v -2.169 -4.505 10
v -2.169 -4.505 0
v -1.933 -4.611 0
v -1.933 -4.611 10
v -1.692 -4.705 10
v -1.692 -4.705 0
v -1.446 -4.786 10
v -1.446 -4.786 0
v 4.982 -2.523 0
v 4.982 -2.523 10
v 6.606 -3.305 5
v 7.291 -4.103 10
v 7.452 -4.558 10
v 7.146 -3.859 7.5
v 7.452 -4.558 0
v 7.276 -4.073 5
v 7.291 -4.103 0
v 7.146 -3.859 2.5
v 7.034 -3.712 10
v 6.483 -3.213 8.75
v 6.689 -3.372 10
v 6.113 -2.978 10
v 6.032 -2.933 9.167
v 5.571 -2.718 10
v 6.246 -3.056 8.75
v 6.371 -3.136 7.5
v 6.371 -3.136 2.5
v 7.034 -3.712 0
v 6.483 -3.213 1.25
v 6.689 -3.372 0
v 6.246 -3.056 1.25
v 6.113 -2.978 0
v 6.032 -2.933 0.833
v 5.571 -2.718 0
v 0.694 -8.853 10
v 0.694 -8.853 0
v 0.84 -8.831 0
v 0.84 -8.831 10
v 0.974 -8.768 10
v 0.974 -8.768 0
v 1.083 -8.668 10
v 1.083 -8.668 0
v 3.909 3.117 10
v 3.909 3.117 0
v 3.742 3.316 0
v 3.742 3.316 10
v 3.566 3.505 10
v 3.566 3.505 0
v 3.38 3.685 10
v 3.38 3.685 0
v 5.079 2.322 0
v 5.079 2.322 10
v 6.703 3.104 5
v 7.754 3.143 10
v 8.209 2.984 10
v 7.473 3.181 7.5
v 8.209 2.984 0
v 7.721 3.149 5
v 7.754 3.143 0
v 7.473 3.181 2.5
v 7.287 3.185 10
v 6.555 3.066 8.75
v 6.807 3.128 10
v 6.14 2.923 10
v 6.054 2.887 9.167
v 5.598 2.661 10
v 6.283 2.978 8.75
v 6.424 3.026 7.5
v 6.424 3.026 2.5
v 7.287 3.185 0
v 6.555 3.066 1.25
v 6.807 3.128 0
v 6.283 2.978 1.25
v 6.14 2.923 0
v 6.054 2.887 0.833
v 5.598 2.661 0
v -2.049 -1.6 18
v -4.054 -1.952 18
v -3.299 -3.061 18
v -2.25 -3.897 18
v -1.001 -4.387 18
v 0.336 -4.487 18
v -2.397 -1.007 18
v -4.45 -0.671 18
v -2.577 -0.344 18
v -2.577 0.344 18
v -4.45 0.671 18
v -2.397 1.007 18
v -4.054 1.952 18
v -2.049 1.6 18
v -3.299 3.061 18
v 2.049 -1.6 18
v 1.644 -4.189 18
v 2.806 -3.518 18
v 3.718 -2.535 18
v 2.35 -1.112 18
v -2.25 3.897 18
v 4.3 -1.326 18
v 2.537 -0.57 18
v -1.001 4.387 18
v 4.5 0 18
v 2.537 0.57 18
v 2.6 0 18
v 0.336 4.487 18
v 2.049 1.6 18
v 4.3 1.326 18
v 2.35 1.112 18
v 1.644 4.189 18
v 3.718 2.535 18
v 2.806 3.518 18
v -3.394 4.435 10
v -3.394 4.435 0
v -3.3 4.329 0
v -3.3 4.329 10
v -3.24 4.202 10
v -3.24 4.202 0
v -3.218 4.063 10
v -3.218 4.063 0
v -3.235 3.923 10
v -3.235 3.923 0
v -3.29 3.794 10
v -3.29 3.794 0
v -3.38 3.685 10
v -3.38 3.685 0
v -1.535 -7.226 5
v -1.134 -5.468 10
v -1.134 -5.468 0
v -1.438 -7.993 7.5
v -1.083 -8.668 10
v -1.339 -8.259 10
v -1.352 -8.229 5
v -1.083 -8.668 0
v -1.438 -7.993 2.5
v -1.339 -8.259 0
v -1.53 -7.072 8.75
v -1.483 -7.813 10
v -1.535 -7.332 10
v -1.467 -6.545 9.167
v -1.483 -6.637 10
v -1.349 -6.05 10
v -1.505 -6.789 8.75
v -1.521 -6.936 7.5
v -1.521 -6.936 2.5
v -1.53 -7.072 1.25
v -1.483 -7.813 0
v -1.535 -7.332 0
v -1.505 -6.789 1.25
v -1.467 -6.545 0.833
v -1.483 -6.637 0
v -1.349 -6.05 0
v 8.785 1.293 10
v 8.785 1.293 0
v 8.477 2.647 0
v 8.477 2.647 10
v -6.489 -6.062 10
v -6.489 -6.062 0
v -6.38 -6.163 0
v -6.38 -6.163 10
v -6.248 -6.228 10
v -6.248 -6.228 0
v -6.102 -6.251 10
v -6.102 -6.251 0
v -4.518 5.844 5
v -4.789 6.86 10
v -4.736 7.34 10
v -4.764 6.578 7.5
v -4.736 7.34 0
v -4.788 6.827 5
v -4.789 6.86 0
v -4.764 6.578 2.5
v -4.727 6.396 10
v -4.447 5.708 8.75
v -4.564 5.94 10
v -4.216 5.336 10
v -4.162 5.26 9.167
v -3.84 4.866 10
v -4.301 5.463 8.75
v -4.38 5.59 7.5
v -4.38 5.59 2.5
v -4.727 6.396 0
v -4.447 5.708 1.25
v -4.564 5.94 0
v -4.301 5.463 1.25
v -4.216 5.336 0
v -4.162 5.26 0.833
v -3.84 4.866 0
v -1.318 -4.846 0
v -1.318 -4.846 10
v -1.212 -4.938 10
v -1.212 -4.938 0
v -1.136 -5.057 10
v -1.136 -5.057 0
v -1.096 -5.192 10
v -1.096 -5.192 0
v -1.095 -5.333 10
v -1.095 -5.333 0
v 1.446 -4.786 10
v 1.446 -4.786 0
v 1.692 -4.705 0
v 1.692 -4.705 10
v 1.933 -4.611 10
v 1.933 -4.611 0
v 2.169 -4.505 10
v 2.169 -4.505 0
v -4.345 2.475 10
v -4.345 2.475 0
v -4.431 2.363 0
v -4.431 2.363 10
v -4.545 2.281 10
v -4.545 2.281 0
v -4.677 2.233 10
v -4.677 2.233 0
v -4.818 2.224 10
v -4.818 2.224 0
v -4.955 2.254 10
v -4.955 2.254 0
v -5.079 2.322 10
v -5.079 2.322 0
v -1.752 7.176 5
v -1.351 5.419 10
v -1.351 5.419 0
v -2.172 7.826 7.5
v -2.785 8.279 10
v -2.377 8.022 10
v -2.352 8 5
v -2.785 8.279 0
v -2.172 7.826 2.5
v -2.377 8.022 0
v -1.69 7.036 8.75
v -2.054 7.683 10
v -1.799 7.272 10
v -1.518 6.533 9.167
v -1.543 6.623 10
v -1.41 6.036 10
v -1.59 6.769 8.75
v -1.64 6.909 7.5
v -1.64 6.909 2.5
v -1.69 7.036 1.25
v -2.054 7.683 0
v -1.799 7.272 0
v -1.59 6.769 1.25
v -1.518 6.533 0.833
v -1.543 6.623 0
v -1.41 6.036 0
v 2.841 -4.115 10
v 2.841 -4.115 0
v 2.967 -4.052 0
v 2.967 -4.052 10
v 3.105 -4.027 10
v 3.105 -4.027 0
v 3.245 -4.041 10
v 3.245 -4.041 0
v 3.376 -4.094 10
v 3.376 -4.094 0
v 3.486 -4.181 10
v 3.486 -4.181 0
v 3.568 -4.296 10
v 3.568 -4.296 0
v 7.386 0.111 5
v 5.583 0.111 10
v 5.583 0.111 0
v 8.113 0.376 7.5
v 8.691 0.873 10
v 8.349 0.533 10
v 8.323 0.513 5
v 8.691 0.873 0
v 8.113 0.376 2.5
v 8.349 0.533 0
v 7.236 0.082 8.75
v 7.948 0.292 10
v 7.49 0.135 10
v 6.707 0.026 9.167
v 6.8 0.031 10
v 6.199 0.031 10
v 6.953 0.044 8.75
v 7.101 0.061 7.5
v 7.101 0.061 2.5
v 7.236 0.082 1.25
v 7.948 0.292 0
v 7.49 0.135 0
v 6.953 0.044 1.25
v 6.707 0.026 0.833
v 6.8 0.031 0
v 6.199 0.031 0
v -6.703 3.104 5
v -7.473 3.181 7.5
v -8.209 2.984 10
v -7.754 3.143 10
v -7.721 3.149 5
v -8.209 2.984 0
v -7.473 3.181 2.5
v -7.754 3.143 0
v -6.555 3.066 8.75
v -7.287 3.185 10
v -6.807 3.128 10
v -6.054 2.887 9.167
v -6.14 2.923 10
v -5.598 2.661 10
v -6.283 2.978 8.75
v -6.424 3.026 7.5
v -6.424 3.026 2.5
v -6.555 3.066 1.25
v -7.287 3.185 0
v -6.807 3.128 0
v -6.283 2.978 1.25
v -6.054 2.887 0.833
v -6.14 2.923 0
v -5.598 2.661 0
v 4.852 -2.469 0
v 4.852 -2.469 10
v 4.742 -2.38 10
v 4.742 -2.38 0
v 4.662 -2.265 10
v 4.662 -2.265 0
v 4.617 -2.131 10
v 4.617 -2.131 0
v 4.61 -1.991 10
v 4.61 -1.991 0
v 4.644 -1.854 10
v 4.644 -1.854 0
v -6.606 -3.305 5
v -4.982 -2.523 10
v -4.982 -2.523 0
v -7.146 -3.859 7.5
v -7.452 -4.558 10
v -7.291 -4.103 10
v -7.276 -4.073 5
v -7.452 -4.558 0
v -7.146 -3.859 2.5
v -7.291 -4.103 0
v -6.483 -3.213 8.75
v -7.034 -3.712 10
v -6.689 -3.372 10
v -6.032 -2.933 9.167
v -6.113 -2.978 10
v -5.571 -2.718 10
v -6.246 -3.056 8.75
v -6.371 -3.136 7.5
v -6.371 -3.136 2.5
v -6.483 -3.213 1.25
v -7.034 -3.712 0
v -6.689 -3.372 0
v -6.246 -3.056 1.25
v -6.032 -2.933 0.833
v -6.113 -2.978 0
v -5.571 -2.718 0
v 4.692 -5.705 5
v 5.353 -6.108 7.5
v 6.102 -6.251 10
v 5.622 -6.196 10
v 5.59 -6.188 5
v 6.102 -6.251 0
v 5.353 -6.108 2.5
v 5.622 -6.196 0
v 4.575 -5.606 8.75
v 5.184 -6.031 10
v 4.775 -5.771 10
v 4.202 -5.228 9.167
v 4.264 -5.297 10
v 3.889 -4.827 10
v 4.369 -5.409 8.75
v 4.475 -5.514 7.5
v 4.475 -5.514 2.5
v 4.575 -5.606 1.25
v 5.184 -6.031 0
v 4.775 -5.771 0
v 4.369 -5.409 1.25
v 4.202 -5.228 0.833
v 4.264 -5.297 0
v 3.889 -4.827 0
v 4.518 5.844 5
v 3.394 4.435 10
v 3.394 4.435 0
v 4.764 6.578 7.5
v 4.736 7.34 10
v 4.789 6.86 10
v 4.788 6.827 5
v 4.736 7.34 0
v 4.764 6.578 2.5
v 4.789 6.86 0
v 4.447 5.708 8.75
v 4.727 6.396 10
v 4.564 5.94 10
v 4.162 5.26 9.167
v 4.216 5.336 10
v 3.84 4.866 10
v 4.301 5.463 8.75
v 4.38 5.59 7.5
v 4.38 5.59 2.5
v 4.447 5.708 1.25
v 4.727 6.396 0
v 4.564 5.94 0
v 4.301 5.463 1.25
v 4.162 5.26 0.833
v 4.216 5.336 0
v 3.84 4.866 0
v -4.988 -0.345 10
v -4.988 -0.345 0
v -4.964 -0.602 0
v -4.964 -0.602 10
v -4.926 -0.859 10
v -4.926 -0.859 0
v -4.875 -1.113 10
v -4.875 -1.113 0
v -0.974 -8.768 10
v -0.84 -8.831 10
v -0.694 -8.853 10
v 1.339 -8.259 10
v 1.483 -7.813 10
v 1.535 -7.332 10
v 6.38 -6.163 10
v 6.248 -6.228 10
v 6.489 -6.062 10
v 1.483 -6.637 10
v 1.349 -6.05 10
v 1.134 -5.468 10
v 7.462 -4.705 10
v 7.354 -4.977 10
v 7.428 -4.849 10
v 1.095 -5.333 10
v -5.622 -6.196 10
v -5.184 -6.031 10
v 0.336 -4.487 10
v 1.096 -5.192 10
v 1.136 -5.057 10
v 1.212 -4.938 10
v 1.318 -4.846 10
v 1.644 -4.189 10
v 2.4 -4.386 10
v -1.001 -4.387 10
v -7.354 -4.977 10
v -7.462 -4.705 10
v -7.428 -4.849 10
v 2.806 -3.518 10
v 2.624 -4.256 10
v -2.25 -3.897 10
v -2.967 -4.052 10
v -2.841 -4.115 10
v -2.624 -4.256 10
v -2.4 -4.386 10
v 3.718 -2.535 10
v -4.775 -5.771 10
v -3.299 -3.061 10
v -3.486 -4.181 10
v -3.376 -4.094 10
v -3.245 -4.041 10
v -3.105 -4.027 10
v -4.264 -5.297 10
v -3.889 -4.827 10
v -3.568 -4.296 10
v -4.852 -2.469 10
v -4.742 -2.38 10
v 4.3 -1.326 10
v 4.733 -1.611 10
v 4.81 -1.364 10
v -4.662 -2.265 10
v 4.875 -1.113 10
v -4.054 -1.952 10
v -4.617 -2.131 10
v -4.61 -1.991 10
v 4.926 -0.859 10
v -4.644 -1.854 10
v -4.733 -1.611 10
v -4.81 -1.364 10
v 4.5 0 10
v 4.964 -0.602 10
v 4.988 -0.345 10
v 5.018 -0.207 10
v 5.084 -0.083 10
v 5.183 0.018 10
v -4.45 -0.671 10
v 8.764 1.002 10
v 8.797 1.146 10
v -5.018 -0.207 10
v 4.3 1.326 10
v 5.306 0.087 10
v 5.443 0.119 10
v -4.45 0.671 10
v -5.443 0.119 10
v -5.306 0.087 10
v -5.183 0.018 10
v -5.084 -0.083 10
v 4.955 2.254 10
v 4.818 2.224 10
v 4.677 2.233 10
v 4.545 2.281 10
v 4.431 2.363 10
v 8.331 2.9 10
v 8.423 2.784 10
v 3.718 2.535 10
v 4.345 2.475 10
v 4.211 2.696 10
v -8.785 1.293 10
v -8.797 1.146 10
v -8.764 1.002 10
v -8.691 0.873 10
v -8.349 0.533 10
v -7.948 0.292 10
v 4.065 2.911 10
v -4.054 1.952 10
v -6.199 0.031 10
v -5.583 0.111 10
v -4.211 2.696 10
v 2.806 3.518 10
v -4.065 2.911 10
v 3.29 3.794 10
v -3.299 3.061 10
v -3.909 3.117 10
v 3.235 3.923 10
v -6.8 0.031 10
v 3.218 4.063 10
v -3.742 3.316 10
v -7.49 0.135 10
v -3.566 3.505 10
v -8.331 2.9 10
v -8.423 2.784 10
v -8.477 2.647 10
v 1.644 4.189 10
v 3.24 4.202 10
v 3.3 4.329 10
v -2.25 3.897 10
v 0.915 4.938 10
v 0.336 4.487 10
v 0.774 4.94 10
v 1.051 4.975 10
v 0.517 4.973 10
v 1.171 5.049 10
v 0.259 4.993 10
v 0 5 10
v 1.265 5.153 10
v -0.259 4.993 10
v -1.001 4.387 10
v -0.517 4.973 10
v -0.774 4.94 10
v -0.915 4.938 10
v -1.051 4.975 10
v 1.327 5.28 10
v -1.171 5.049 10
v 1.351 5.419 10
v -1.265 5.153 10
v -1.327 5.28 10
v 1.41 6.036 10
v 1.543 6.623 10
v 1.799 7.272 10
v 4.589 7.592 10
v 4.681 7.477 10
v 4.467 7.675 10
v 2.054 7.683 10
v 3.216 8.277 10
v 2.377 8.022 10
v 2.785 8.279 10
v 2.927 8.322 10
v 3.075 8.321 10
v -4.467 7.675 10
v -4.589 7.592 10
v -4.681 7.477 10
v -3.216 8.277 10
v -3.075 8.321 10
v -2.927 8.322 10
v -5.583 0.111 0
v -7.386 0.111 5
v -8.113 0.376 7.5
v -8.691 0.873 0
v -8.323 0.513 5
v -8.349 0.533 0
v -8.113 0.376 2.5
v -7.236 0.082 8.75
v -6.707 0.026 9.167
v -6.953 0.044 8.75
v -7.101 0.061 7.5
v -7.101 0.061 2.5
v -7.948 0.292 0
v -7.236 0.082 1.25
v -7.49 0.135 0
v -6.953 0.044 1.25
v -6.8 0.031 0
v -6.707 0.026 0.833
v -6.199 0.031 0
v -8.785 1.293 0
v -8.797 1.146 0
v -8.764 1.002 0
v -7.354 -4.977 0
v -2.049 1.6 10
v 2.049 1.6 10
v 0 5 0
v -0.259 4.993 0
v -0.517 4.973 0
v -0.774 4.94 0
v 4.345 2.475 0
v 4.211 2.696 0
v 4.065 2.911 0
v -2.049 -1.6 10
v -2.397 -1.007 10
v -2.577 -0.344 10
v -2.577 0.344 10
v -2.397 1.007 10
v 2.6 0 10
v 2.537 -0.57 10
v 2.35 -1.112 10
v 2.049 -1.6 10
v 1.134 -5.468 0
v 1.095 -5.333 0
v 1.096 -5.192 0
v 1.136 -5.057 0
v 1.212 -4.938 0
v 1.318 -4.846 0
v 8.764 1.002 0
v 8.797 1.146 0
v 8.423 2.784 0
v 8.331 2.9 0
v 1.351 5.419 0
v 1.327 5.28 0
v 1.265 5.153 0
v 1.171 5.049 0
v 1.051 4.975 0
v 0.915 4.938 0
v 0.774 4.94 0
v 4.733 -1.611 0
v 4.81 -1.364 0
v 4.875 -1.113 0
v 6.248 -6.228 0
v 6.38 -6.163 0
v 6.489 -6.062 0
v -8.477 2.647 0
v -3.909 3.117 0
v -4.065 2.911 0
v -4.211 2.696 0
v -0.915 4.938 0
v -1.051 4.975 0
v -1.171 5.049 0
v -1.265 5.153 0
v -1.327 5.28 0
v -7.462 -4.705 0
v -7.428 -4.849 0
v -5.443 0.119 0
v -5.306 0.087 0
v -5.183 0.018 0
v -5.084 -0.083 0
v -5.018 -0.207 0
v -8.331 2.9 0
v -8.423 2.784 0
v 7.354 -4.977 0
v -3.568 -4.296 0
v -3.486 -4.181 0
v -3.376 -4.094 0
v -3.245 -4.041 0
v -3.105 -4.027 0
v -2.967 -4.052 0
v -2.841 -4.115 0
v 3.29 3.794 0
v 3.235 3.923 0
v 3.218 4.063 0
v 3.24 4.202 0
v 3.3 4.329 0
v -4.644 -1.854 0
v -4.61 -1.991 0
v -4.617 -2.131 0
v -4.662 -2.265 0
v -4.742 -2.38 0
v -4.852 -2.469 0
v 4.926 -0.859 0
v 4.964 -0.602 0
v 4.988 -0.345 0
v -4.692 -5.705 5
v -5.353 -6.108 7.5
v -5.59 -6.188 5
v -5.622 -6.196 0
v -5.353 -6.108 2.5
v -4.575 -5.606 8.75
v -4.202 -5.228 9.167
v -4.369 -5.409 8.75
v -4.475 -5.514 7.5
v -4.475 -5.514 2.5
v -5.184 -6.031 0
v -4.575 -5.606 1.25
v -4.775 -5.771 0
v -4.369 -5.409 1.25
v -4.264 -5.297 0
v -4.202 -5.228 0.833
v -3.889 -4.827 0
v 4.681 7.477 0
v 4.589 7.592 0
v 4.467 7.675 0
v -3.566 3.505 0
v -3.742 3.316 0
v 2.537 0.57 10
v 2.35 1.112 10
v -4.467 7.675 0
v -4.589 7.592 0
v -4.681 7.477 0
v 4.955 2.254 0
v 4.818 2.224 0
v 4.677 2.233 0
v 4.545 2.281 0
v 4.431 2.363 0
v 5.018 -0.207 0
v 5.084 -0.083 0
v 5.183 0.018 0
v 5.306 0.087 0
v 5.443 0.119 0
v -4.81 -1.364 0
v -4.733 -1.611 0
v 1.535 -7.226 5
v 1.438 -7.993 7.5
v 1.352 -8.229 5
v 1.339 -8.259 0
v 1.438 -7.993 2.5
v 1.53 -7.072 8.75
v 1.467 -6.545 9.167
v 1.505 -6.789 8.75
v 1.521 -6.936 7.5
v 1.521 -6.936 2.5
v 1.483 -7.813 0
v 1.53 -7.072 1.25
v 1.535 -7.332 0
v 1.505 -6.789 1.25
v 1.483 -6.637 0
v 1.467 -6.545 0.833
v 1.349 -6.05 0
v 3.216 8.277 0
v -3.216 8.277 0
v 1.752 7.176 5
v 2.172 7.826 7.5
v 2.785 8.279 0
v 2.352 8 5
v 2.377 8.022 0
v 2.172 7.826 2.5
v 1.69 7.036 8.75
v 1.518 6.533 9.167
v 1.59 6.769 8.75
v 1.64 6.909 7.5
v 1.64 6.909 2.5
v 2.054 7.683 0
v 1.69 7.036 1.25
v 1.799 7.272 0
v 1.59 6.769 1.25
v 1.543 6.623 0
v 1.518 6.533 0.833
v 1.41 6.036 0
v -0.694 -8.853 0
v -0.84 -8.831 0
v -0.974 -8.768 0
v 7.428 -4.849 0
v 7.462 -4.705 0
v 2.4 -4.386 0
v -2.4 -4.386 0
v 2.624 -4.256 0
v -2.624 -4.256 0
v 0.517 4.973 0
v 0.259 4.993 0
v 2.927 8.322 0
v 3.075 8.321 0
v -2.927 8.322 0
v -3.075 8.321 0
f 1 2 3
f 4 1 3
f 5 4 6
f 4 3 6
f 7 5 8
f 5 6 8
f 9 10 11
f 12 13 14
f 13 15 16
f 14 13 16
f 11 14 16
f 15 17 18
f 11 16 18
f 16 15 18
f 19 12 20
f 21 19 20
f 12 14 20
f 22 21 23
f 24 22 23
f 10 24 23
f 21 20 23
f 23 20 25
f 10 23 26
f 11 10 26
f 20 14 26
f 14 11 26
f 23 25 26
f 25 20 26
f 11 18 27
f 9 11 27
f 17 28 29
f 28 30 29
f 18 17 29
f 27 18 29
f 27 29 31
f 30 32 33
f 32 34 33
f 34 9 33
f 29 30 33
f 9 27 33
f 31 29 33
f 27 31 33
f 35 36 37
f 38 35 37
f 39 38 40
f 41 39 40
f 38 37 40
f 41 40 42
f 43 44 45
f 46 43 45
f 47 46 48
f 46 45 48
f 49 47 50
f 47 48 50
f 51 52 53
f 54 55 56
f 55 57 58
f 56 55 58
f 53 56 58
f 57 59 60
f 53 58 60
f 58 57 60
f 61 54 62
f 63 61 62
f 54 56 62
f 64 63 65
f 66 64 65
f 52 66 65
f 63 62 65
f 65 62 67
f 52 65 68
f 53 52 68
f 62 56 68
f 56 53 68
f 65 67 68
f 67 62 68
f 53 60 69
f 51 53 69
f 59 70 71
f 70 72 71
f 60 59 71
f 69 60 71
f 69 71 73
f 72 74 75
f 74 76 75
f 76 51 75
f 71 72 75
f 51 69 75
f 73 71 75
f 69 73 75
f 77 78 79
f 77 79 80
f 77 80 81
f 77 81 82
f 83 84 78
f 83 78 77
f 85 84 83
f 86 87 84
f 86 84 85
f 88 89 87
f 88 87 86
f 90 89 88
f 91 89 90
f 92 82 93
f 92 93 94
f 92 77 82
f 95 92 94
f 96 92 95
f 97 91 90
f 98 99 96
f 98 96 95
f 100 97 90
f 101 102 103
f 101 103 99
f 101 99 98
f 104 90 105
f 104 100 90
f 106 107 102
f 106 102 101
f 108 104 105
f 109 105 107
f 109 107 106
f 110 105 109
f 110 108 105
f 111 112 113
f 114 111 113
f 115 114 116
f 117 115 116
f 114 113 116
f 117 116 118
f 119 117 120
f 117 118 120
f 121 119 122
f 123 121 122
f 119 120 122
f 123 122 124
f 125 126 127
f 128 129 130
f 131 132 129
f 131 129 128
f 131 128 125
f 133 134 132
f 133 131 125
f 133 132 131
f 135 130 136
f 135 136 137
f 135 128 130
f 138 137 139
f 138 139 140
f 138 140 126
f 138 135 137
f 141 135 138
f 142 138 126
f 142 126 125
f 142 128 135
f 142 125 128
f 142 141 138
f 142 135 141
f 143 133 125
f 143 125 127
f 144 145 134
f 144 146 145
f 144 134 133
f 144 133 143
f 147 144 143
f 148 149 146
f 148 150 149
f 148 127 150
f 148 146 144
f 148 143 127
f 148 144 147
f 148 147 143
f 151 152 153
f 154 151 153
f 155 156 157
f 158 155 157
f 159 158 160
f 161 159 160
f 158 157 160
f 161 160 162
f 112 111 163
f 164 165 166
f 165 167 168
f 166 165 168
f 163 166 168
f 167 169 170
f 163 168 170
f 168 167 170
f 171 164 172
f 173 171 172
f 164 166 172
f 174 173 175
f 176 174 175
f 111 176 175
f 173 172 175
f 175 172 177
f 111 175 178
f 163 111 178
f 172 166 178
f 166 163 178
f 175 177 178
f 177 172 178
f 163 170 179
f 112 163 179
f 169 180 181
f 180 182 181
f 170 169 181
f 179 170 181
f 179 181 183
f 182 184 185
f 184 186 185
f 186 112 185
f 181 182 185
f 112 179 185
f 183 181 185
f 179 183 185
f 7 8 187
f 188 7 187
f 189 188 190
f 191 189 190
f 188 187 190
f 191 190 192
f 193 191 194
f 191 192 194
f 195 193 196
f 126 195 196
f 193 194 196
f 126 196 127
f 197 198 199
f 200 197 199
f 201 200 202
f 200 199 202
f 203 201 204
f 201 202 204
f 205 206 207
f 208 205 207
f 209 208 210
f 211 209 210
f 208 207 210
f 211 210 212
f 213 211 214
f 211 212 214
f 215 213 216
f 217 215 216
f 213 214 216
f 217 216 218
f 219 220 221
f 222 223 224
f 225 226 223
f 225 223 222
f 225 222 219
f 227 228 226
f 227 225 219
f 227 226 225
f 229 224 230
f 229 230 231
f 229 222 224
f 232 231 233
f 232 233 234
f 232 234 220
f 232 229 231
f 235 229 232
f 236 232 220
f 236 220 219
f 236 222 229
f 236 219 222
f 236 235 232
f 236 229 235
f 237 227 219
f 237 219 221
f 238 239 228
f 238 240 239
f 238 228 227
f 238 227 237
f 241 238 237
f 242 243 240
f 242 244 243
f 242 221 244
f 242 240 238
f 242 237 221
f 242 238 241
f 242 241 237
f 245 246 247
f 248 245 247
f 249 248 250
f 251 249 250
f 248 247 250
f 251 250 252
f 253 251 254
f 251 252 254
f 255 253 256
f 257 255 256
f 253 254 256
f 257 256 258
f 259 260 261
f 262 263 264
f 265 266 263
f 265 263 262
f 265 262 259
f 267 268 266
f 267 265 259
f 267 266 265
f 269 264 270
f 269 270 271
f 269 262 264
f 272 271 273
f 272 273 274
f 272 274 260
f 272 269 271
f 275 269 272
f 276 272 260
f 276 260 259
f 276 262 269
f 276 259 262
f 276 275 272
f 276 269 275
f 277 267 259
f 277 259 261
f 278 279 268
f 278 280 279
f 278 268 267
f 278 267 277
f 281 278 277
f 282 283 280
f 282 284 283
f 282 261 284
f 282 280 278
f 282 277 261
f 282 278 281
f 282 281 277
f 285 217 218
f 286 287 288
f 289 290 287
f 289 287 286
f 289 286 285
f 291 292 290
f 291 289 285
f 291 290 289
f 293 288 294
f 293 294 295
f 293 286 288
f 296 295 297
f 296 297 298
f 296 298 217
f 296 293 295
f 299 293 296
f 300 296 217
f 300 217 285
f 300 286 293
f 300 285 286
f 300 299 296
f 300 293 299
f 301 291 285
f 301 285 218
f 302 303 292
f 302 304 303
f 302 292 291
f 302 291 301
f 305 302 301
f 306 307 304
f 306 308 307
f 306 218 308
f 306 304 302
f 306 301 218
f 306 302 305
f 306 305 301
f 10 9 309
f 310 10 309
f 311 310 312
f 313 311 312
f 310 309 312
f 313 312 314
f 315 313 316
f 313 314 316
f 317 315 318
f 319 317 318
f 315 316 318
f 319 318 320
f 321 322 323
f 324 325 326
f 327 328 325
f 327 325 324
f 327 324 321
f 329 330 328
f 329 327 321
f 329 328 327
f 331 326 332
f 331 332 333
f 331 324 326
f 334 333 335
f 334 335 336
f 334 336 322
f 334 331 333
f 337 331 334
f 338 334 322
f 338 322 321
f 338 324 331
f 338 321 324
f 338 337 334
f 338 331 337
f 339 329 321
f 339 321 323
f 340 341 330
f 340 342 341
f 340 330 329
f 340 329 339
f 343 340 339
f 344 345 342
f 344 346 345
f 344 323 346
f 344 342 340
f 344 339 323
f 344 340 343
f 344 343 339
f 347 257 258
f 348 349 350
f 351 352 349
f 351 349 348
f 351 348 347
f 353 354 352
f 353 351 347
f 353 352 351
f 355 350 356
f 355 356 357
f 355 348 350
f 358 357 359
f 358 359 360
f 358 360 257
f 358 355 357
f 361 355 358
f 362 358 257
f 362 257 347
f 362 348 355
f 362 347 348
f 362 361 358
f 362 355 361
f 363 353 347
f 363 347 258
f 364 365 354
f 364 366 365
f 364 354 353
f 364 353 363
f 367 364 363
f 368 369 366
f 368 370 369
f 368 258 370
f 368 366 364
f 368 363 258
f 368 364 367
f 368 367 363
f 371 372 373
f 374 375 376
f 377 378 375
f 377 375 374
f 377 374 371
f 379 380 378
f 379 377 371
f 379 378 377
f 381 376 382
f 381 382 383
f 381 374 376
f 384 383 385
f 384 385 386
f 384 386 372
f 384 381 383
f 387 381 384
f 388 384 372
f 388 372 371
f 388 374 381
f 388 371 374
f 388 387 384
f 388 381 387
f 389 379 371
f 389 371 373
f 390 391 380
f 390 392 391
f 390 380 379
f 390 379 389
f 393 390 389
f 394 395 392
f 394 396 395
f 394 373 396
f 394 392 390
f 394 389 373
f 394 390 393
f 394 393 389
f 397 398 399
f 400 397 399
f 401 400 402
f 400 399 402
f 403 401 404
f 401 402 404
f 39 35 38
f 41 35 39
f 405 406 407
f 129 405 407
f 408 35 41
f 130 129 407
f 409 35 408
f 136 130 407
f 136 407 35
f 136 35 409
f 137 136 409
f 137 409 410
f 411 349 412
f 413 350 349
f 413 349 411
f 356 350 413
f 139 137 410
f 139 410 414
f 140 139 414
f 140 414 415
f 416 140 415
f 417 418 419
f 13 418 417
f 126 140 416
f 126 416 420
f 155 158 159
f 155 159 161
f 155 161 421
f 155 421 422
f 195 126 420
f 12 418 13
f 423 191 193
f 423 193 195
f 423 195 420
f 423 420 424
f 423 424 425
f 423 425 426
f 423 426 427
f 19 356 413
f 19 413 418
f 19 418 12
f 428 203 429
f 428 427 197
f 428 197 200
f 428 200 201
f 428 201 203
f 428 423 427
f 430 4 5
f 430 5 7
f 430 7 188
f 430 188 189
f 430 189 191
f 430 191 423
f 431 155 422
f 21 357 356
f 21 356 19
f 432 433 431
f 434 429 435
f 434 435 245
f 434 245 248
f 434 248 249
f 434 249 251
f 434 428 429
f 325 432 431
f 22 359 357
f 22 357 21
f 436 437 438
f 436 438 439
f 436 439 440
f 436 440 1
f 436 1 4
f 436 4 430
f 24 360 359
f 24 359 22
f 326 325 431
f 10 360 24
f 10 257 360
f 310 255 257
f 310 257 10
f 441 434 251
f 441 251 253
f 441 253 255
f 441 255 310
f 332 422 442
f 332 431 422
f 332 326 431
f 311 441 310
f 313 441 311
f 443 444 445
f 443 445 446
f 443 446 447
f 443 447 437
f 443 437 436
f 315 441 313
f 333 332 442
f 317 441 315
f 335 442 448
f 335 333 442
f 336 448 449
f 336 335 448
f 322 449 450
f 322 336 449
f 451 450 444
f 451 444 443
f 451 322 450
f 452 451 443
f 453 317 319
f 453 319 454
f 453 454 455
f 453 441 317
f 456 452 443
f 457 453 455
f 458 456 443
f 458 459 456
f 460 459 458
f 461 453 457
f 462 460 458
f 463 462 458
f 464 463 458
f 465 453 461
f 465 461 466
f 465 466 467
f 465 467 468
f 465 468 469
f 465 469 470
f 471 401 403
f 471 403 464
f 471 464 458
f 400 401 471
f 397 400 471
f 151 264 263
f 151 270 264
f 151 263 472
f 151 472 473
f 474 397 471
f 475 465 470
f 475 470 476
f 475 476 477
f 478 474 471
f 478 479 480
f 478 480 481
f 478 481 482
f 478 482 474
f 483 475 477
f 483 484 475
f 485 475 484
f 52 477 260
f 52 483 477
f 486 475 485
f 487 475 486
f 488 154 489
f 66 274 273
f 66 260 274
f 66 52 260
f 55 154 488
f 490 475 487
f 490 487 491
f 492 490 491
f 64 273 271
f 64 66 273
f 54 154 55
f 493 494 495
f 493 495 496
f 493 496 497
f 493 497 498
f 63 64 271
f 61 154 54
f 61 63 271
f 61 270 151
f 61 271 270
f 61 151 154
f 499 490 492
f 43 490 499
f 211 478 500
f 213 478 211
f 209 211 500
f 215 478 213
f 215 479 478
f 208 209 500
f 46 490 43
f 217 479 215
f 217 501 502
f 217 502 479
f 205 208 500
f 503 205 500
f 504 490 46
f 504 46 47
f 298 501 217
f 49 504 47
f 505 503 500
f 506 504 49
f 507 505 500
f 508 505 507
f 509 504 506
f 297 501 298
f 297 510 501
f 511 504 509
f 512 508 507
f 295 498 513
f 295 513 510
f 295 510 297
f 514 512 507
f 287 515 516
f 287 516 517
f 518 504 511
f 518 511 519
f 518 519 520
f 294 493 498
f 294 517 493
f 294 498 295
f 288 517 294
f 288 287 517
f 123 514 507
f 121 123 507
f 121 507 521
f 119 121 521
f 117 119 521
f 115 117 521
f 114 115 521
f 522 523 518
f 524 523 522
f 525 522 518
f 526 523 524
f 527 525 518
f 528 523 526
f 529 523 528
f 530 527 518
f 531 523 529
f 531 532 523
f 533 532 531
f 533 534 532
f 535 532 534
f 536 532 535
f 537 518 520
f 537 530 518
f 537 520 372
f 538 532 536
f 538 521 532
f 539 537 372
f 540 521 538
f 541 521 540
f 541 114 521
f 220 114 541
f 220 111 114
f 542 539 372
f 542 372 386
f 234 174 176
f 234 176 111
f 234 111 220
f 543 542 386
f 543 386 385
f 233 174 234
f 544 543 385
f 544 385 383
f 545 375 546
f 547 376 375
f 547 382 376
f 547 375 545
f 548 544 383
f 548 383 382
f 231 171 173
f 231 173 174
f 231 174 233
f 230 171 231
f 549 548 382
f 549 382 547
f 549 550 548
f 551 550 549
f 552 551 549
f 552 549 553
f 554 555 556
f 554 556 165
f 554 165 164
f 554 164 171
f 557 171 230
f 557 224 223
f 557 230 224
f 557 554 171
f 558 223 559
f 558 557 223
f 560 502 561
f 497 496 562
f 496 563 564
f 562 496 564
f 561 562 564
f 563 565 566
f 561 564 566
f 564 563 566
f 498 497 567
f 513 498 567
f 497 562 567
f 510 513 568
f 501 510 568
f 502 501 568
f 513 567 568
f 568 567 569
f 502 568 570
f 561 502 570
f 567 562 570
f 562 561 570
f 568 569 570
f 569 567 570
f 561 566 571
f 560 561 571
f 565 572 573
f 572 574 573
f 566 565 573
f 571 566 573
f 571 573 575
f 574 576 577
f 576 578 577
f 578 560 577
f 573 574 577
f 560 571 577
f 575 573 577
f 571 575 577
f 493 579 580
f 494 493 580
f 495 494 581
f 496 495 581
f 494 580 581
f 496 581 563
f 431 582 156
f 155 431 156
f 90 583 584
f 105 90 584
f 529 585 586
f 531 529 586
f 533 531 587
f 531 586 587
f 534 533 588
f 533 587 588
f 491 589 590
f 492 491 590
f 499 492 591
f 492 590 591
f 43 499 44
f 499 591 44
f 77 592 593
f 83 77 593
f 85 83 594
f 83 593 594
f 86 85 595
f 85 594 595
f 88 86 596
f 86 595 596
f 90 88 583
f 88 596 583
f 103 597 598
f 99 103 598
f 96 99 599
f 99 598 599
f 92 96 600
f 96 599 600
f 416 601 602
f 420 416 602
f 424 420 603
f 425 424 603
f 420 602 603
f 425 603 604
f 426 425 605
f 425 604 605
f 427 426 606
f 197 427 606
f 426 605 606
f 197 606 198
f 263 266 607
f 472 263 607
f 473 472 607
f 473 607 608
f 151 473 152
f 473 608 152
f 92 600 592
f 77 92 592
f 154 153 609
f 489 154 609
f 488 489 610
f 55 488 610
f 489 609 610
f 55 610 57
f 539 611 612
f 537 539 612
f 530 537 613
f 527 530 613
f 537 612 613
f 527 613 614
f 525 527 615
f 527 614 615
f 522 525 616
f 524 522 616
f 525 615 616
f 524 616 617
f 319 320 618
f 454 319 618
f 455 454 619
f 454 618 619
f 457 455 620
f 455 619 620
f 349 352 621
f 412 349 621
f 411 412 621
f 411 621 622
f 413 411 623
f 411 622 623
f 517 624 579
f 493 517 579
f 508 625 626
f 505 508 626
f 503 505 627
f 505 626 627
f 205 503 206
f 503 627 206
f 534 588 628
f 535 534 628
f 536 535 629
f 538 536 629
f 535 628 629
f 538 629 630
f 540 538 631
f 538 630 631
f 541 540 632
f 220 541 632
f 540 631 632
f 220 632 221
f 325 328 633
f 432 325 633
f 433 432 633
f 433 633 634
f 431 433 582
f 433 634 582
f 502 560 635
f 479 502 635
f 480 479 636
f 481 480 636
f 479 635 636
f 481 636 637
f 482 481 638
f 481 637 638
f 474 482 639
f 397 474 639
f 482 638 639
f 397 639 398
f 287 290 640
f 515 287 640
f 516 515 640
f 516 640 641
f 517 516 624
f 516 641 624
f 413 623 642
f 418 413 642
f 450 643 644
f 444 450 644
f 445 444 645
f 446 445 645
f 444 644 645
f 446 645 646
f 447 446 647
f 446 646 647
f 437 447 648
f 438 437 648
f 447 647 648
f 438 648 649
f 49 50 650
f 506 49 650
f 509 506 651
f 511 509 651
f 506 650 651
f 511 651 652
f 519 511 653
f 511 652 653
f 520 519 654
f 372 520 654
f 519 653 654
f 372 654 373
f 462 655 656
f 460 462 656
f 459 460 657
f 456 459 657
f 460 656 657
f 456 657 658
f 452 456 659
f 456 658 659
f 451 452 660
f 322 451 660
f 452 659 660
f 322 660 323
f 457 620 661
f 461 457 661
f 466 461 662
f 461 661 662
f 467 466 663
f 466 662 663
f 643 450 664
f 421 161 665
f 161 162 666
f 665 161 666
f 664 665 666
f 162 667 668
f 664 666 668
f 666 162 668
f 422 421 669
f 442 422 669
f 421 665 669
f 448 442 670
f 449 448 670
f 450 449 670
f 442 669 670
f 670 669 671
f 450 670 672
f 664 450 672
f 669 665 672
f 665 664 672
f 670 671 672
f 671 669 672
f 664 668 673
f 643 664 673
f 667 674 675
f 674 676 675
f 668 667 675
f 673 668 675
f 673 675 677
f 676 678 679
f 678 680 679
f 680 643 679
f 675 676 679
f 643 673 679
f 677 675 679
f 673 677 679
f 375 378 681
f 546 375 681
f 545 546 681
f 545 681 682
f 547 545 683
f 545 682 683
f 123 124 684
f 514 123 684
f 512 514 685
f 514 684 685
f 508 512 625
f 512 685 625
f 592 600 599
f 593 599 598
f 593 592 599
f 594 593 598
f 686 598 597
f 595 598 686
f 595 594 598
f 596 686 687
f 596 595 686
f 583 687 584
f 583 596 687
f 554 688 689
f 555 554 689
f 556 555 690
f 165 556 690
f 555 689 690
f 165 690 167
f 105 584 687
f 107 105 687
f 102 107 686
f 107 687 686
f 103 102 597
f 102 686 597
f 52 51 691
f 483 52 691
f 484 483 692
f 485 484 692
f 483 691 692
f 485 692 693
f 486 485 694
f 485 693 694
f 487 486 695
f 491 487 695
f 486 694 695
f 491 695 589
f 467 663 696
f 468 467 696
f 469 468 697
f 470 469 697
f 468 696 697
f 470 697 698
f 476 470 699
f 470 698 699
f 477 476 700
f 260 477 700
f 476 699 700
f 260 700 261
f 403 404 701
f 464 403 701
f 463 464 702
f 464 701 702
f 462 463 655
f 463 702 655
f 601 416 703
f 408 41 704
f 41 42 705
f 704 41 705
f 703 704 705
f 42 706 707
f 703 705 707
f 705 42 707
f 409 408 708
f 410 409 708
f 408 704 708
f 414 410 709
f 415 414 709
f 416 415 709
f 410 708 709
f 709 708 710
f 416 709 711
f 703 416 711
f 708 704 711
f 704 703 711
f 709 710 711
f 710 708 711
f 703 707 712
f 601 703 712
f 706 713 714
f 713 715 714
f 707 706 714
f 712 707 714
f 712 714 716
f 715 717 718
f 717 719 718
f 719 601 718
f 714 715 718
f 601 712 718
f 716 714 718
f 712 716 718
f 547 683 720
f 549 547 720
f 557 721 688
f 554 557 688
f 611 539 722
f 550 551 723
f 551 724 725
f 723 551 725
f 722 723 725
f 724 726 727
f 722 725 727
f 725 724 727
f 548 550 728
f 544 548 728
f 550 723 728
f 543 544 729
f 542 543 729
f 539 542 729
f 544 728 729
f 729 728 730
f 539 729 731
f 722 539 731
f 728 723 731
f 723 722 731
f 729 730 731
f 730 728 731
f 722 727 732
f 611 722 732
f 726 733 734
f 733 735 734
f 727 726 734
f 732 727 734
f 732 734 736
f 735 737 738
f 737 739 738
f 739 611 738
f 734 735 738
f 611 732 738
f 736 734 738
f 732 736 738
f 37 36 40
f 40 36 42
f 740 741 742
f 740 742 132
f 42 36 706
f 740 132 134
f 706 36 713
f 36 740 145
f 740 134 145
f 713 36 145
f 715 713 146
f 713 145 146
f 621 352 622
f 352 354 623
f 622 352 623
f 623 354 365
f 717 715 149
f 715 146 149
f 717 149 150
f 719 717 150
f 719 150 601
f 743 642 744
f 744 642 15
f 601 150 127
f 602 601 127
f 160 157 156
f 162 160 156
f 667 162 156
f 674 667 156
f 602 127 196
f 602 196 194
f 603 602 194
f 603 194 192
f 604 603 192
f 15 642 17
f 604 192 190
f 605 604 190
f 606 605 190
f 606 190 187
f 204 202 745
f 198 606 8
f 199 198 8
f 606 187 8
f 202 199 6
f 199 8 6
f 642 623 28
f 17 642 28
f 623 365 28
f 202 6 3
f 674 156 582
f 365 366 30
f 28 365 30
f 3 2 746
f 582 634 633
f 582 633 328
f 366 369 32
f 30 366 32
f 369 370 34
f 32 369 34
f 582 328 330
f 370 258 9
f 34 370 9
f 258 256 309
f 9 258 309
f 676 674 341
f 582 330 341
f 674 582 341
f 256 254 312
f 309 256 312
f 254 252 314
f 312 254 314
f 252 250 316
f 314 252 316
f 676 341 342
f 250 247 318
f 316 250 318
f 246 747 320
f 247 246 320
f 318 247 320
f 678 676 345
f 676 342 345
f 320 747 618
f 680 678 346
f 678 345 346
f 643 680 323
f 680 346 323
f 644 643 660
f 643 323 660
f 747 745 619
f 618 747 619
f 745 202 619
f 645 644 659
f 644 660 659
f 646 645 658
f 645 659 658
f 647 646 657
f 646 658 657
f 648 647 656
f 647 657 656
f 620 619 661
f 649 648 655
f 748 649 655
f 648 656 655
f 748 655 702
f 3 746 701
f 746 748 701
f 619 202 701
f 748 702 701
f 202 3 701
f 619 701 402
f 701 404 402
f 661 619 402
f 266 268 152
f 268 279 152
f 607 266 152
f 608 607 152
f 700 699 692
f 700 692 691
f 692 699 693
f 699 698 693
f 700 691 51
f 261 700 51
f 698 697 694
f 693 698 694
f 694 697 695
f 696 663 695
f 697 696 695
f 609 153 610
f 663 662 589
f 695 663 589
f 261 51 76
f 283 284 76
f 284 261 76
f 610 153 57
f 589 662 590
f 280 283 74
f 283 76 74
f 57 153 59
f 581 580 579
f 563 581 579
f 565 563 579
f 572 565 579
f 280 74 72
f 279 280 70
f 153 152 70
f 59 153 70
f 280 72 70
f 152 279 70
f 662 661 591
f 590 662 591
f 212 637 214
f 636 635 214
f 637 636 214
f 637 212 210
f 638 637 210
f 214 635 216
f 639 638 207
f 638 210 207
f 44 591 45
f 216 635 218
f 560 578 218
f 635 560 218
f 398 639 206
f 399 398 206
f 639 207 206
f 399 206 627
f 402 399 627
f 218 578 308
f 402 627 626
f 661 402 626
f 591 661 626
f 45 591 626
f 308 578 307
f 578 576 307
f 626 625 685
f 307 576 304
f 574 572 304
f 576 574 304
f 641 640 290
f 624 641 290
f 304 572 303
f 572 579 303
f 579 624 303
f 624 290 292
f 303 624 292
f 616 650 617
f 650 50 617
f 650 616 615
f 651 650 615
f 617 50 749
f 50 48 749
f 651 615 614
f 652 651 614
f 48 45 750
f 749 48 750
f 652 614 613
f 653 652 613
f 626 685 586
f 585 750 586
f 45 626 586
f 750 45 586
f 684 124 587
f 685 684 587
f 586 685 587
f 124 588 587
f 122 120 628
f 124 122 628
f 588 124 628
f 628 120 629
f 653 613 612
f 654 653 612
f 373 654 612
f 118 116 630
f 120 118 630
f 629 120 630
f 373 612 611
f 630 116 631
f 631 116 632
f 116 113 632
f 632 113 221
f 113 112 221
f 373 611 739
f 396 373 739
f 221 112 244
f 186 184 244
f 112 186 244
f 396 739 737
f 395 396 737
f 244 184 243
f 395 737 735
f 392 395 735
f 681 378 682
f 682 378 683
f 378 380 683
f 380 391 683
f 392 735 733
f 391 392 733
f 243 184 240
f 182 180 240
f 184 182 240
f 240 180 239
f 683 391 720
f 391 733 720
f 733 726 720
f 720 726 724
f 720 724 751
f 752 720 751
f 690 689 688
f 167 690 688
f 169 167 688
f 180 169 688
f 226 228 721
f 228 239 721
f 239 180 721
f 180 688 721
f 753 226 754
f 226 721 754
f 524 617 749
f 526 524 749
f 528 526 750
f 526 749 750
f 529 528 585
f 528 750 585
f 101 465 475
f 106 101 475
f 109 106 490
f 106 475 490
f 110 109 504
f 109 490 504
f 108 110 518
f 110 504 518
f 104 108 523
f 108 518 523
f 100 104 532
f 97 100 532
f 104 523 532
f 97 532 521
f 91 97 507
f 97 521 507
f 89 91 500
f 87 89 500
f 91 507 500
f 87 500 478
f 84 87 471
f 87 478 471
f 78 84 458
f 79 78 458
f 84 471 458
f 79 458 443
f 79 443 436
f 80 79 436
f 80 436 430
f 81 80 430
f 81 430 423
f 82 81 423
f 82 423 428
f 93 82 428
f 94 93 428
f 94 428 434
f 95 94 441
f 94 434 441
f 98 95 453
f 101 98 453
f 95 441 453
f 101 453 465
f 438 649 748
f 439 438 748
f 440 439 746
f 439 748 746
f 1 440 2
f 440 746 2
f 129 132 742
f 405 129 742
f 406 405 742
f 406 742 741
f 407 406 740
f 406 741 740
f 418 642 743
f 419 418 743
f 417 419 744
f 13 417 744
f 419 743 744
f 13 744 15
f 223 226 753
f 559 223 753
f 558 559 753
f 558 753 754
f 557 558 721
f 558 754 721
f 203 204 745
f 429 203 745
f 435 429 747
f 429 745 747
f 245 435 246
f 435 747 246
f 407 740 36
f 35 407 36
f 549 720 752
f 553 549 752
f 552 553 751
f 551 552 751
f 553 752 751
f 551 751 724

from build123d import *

# Parameters (mm, degrees)
F1_DEPTH = 10
F2_COUNT = 7
F2_ANGLE = 308.5714285714
F3_R     = 4.5
F4_DEPTH = 8


with BuildPart() as f1:
    # F0 (on Top) → F1 (new body)
    with BuildSketch(Plane.XY):
        with BuildLine():
            Line((2.1694186956, -4.5048443395), (0, 0))
            Line((0, 0), (-2.1694186956, -4.5048443395))
            ThreePointArc((-2.1694186956, -4.5048443395), (-1.8131769027, -4.6596555151), (-1.4459926079, -4.7863457228))
            ThreePointArc((-1.4459926079, -4.7863457228), (-1.1360019143, -5.0567785338), (-1.1337288621, -5.4681457281))
            add(Edge.make_bspline(
                [(-1.0826978963, -8.6677274808), (-1.4220303963, -8.2489427131), (-1.6630910077, -7.2785752045), (-1.3914458364, -6.0476801005), (-1.1337288621, -5.4681457281)],
                knots=[0.0602672768, 0.0602672768, 0.0602672768, 0.0602672768, 0.4600969779, 0.8689019138, 0.8689019138, 0.8689019138, 0.8689019138], degree=3))
            ThreePointArc((-1.0826978963, -8.6677274808), (-0.9094070817, -8.8042759726), (-0.6942189728, -8.8529511696))
            Line((-0.6942189728, -8.8529511696), (0.6942189728, -8.8529511696))
            ThreePointArc((0.6942189728, -8.8529511696), (0.9094070817, -8.8042759726), (1.0826978963, -8.6677274808))
            add(Edge.make_bspline(
                [(1.0826978963, -8.6677274808), (1.4220303963, -8.2489427131), (1.6630910077, -7.2785752045), (1.3914458364, -6.0476801005), (1.1337288621, -5.4681457281)],
                knots=[0.0602672768, 0.0602672768, 0.0602672768, 0.0602672768, 0.4600969779, 0.8689019138, 0.8689019138, 0.8689019138, 0.8689019138], degree=3))
            ThreePointArc((1.1337288621, -5.4681457281), (1.1360019143, -5.0567785338), (1.4459926079, -4.7863457228))
            ThreePointArc((1.4459926079, -4.7863457228), (1.8131769027, -4.6596555151), (2.1694186956, -4.5048443395))
        make_face()
    extrude(amount=F1_DEPTH)

    # F2: F1 ×7 about axis
    f2_axis = Axis((0, 0, 5), (0, 0, -1))


with BuildPart() as f1_1:
    add(f1.part)
    for i in range(1, F2_COUNT):
        add(f1.part.rotate(f2_axis, i * F2_ANGLE / (F2_COUNT - 1)))

    # F3 (on face) → F4 (join)
    with BuildSketch(Plane.XY.offset(10)):
        Circle(F3_R)
        with BuildLine():
            ThreePointArc((2.0493901532, 1.6), (2.458496939, 0.8460453894), (2.6, 0))
            ThreePointArc((2.6, 0), (2.458496939, -0.8460453894), (2.0493901532, -1.6))
            ThreePointArc((2.0493901532, -1.6), (0, -2.6), (-2.0493901532, -1.6))
            ThreePointArc((-2.0493901532, -1.6), (-2.6, 0), (-2.0493901532, 1.6))
            ThreePointArc((-2.0493901532, 1.6), (0, 2.6), (2.0493901532, 1.6))
        make_face(mode=Mode.SUBTRACT)
        with BuildLine():
            Line((-2.0493901532, 1.6), (2.0493901532, 1.6))
            ThreePointArc((2.0493901532, 1.6), (0, 2.6), (-2.0493901532, 1.6))
        make_face()
        with BuildLine():
            ThreePointArc((-2.0493901532, -1.6), (0, -2.6), (2.0493901532, -1.6))
            Line((2.0493901532, -1.6), (-2.0493901532, -1.6))
        make_face()
    extrude(amount=F4_DEPTH)


solid = f1_1.part
